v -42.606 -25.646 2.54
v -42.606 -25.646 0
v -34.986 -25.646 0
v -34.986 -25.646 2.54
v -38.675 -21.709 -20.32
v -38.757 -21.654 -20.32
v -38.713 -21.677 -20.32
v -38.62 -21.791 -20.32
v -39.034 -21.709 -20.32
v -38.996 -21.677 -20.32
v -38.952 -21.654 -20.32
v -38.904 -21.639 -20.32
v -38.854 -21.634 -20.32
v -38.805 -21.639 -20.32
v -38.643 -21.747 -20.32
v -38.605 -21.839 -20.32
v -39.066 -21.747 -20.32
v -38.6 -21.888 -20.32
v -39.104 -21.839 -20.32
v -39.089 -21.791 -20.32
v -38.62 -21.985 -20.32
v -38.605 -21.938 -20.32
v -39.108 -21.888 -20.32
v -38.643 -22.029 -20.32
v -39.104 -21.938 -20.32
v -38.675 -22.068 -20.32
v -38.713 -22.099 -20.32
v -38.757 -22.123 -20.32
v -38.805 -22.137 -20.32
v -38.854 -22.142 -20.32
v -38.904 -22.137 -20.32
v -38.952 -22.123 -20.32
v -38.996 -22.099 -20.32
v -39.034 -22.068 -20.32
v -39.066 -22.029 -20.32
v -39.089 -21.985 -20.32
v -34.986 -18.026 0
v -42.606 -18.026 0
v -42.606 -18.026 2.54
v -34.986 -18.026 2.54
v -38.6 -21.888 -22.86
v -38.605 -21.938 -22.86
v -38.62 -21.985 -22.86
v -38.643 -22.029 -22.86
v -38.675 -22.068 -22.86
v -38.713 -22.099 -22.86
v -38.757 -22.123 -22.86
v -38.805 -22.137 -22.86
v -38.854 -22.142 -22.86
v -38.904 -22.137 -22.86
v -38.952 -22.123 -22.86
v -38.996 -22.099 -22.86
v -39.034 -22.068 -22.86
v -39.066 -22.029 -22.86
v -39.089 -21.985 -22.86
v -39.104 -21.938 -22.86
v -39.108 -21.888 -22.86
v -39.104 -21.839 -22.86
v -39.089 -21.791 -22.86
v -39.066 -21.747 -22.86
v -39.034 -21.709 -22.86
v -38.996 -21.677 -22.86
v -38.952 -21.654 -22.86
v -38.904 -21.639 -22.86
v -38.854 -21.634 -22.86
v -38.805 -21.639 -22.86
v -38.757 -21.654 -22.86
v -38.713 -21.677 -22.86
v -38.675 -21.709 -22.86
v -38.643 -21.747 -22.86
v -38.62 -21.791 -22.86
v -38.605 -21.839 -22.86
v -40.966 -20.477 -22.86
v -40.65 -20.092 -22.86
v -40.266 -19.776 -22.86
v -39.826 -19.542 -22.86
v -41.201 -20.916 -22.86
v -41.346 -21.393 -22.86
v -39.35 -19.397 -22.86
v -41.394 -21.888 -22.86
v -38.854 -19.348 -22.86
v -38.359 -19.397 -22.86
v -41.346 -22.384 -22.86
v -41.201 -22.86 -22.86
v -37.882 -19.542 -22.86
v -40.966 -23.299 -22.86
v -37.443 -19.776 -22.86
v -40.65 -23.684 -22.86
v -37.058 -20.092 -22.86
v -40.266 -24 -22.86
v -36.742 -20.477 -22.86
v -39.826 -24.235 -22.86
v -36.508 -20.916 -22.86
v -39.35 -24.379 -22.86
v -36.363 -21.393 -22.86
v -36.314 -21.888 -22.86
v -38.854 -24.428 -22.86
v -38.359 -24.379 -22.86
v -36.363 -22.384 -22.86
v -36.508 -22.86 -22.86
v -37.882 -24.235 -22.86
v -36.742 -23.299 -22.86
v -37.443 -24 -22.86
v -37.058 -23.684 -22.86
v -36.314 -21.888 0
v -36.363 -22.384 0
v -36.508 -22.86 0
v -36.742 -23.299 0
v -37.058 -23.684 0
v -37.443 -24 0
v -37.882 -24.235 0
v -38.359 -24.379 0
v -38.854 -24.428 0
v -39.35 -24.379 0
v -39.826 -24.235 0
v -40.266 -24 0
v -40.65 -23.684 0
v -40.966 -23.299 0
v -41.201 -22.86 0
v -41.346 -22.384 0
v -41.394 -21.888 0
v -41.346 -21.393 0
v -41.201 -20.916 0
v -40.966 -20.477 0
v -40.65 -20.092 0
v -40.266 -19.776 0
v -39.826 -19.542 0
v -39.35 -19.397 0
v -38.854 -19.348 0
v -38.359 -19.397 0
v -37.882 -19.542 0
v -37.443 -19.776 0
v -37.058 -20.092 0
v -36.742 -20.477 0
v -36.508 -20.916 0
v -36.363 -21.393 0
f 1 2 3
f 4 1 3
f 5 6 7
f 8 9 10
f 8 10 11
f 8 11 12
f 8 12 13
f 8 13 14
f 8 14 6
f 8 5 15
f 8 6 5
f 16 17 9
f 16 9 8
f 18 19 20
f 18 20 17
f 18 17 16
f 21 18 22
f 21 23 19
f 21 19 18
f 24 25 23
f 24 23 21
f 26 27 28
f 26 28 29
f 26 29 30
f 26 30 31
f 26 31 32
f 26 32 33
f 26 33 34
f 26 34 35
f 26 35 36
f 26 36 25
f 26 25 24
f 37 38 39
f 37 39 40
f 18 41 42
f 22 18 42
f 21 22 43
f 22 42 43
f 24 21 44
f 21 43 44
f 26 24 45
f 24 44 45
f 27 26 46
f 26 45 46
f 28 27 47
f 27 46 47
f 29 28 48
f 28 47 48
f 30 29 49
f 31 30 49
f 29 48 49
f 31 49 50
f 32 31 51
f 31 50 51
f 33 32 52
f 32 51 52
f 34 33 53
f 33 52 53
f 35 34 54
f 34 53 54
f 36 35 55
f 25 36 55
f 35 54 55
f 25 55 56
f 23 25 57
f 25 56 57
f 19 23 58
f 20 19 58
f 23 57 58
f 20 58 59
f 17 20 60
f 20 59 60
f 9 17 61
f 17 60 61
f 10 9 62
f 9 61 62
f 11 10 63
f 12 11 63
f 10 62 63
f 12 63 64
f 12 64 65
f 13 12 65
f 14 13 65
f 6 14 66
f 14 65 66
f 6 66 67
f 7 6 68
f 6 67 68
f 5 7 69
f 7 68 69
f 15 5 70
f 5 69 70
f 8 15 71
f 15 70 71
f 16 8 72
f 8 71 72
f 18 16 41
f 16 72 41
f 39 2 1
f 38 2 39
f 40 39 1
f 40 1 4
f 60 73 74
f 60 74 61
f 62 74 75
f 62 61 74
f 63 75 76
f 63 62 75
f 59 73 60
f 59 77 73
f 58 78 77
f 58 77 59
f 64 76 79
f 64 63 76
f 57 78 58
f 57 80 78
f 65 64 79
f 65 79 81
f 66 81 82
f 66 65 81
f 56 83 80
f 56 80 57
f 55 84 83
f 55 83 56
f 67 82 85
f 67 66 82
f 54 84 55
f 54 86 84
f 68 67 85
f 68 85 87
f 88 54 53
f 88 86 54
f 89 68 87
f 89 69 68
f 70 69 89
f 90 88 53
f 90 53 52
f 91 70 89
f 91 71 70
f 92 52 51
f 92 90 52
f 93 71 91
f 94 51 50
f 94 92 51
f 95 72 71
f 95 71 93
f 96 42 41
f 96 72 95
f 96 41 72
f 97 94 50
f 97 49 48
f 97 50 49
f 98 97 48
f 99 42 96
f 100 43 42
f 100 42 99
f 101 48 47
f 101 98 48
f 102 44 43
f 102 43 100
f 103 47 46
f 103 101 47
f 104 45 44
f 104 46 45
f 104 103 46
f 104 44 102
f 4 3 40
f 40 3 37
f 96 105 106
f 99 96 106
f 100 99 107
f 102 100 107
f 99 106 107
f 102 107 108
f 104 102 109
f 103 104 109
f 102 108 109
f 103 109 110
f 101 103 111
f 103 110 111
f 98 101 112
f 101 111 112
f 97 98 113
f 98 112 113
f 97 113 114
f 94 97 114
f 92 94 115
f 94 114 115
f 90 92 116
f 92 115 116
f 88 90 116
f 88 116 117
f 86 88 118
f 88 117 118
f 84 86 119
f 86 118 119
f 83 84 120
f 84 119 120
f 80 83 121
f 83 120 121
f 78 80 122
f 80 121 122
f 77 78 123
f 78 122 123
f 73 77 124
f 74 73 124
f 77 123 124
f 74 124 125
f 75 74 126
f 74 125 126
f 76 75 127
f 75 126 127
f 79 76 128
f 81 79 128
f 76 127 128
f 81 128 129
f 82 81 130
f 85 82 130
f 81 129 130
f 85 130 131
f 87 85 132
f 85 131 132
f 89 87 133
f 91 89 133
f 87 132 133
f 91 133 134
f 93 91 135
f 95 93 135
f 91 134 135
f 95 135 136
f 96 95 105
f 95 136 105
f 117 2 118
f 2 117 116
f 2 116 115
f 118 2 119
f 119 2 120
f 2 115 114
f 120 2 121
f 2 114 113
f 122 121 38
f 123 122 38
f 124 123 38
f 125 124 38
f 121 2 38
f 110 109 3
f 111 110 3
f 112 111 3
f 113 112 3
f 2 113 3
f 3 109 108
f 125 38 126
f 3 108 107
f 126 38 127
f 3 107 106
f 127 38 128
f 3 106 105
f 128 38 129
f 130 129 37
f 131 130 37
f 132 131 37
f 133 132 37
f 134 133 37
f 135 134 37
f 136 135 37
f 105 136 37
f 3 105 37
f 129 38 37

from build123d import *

# Parameters (mm, degrees)
F0_W     = 7.62
F0_H     = 7.62
F1_DEPTH = 2.54
F2_R     = 1.27
F3_DEPTH = 22.86
F4_R     = 0.254
F5_DEPTH = 2.54
F2_R_2   = 2.54
F6_DEPTH = 22.86


# Not quite as in the source:
# - a feature names something its author has since deleted; it is built from what else it names


with BuildPart() as f1:
    # F0 (on Top) → F1 (new body)
    with BuildSketch(Plane.XY):
        with Locations((-38.7955456972, -21.8359371471)):
            Rectangle(F0_W, F0_H)
    extrude(amount=F1_DEPTH)

    # F2 (on face) → F3 (join)
    with BuildSketch(Plane(origin=(0, 0, 0), x_dir=(1, 0, 0), z_dir=(0, 0, -1))):
        with Locations((-38.854431361, 21.8882076442)):
            Circle(F2_R)
    extrude(amount=F3_DEPTH)

    # F4 (on face) → F5 (cut)
    with BuildSketch(Plane(origin=(0, 0, -22.86), x_dir=(1, 0, 0), z_dir=(0, 0, -1))):
        with Locations((-38.854431361, 21.8882076442)):
            Circle(F4_R)
    extrude(amount=-F5_DEPTH, mode=Mode.SUBTRACT)

    # F2 (on face) → F6 (join)
    with BuildSketch(Plane(origin=(0, 0, 0), x_dir=(1, 0, 0), z_dir=(0, 0, -1))):
        with Locations((-38.854431361, 21.8882076442)):
            Circle(F2_R_2)
        with Locations((-38.854431361, 21.8882076442)):
            Circle(F2_R, mode=Mode.SUBTRACT)
    extrude(amount=F6_DEPTH)


solid = f1.part
